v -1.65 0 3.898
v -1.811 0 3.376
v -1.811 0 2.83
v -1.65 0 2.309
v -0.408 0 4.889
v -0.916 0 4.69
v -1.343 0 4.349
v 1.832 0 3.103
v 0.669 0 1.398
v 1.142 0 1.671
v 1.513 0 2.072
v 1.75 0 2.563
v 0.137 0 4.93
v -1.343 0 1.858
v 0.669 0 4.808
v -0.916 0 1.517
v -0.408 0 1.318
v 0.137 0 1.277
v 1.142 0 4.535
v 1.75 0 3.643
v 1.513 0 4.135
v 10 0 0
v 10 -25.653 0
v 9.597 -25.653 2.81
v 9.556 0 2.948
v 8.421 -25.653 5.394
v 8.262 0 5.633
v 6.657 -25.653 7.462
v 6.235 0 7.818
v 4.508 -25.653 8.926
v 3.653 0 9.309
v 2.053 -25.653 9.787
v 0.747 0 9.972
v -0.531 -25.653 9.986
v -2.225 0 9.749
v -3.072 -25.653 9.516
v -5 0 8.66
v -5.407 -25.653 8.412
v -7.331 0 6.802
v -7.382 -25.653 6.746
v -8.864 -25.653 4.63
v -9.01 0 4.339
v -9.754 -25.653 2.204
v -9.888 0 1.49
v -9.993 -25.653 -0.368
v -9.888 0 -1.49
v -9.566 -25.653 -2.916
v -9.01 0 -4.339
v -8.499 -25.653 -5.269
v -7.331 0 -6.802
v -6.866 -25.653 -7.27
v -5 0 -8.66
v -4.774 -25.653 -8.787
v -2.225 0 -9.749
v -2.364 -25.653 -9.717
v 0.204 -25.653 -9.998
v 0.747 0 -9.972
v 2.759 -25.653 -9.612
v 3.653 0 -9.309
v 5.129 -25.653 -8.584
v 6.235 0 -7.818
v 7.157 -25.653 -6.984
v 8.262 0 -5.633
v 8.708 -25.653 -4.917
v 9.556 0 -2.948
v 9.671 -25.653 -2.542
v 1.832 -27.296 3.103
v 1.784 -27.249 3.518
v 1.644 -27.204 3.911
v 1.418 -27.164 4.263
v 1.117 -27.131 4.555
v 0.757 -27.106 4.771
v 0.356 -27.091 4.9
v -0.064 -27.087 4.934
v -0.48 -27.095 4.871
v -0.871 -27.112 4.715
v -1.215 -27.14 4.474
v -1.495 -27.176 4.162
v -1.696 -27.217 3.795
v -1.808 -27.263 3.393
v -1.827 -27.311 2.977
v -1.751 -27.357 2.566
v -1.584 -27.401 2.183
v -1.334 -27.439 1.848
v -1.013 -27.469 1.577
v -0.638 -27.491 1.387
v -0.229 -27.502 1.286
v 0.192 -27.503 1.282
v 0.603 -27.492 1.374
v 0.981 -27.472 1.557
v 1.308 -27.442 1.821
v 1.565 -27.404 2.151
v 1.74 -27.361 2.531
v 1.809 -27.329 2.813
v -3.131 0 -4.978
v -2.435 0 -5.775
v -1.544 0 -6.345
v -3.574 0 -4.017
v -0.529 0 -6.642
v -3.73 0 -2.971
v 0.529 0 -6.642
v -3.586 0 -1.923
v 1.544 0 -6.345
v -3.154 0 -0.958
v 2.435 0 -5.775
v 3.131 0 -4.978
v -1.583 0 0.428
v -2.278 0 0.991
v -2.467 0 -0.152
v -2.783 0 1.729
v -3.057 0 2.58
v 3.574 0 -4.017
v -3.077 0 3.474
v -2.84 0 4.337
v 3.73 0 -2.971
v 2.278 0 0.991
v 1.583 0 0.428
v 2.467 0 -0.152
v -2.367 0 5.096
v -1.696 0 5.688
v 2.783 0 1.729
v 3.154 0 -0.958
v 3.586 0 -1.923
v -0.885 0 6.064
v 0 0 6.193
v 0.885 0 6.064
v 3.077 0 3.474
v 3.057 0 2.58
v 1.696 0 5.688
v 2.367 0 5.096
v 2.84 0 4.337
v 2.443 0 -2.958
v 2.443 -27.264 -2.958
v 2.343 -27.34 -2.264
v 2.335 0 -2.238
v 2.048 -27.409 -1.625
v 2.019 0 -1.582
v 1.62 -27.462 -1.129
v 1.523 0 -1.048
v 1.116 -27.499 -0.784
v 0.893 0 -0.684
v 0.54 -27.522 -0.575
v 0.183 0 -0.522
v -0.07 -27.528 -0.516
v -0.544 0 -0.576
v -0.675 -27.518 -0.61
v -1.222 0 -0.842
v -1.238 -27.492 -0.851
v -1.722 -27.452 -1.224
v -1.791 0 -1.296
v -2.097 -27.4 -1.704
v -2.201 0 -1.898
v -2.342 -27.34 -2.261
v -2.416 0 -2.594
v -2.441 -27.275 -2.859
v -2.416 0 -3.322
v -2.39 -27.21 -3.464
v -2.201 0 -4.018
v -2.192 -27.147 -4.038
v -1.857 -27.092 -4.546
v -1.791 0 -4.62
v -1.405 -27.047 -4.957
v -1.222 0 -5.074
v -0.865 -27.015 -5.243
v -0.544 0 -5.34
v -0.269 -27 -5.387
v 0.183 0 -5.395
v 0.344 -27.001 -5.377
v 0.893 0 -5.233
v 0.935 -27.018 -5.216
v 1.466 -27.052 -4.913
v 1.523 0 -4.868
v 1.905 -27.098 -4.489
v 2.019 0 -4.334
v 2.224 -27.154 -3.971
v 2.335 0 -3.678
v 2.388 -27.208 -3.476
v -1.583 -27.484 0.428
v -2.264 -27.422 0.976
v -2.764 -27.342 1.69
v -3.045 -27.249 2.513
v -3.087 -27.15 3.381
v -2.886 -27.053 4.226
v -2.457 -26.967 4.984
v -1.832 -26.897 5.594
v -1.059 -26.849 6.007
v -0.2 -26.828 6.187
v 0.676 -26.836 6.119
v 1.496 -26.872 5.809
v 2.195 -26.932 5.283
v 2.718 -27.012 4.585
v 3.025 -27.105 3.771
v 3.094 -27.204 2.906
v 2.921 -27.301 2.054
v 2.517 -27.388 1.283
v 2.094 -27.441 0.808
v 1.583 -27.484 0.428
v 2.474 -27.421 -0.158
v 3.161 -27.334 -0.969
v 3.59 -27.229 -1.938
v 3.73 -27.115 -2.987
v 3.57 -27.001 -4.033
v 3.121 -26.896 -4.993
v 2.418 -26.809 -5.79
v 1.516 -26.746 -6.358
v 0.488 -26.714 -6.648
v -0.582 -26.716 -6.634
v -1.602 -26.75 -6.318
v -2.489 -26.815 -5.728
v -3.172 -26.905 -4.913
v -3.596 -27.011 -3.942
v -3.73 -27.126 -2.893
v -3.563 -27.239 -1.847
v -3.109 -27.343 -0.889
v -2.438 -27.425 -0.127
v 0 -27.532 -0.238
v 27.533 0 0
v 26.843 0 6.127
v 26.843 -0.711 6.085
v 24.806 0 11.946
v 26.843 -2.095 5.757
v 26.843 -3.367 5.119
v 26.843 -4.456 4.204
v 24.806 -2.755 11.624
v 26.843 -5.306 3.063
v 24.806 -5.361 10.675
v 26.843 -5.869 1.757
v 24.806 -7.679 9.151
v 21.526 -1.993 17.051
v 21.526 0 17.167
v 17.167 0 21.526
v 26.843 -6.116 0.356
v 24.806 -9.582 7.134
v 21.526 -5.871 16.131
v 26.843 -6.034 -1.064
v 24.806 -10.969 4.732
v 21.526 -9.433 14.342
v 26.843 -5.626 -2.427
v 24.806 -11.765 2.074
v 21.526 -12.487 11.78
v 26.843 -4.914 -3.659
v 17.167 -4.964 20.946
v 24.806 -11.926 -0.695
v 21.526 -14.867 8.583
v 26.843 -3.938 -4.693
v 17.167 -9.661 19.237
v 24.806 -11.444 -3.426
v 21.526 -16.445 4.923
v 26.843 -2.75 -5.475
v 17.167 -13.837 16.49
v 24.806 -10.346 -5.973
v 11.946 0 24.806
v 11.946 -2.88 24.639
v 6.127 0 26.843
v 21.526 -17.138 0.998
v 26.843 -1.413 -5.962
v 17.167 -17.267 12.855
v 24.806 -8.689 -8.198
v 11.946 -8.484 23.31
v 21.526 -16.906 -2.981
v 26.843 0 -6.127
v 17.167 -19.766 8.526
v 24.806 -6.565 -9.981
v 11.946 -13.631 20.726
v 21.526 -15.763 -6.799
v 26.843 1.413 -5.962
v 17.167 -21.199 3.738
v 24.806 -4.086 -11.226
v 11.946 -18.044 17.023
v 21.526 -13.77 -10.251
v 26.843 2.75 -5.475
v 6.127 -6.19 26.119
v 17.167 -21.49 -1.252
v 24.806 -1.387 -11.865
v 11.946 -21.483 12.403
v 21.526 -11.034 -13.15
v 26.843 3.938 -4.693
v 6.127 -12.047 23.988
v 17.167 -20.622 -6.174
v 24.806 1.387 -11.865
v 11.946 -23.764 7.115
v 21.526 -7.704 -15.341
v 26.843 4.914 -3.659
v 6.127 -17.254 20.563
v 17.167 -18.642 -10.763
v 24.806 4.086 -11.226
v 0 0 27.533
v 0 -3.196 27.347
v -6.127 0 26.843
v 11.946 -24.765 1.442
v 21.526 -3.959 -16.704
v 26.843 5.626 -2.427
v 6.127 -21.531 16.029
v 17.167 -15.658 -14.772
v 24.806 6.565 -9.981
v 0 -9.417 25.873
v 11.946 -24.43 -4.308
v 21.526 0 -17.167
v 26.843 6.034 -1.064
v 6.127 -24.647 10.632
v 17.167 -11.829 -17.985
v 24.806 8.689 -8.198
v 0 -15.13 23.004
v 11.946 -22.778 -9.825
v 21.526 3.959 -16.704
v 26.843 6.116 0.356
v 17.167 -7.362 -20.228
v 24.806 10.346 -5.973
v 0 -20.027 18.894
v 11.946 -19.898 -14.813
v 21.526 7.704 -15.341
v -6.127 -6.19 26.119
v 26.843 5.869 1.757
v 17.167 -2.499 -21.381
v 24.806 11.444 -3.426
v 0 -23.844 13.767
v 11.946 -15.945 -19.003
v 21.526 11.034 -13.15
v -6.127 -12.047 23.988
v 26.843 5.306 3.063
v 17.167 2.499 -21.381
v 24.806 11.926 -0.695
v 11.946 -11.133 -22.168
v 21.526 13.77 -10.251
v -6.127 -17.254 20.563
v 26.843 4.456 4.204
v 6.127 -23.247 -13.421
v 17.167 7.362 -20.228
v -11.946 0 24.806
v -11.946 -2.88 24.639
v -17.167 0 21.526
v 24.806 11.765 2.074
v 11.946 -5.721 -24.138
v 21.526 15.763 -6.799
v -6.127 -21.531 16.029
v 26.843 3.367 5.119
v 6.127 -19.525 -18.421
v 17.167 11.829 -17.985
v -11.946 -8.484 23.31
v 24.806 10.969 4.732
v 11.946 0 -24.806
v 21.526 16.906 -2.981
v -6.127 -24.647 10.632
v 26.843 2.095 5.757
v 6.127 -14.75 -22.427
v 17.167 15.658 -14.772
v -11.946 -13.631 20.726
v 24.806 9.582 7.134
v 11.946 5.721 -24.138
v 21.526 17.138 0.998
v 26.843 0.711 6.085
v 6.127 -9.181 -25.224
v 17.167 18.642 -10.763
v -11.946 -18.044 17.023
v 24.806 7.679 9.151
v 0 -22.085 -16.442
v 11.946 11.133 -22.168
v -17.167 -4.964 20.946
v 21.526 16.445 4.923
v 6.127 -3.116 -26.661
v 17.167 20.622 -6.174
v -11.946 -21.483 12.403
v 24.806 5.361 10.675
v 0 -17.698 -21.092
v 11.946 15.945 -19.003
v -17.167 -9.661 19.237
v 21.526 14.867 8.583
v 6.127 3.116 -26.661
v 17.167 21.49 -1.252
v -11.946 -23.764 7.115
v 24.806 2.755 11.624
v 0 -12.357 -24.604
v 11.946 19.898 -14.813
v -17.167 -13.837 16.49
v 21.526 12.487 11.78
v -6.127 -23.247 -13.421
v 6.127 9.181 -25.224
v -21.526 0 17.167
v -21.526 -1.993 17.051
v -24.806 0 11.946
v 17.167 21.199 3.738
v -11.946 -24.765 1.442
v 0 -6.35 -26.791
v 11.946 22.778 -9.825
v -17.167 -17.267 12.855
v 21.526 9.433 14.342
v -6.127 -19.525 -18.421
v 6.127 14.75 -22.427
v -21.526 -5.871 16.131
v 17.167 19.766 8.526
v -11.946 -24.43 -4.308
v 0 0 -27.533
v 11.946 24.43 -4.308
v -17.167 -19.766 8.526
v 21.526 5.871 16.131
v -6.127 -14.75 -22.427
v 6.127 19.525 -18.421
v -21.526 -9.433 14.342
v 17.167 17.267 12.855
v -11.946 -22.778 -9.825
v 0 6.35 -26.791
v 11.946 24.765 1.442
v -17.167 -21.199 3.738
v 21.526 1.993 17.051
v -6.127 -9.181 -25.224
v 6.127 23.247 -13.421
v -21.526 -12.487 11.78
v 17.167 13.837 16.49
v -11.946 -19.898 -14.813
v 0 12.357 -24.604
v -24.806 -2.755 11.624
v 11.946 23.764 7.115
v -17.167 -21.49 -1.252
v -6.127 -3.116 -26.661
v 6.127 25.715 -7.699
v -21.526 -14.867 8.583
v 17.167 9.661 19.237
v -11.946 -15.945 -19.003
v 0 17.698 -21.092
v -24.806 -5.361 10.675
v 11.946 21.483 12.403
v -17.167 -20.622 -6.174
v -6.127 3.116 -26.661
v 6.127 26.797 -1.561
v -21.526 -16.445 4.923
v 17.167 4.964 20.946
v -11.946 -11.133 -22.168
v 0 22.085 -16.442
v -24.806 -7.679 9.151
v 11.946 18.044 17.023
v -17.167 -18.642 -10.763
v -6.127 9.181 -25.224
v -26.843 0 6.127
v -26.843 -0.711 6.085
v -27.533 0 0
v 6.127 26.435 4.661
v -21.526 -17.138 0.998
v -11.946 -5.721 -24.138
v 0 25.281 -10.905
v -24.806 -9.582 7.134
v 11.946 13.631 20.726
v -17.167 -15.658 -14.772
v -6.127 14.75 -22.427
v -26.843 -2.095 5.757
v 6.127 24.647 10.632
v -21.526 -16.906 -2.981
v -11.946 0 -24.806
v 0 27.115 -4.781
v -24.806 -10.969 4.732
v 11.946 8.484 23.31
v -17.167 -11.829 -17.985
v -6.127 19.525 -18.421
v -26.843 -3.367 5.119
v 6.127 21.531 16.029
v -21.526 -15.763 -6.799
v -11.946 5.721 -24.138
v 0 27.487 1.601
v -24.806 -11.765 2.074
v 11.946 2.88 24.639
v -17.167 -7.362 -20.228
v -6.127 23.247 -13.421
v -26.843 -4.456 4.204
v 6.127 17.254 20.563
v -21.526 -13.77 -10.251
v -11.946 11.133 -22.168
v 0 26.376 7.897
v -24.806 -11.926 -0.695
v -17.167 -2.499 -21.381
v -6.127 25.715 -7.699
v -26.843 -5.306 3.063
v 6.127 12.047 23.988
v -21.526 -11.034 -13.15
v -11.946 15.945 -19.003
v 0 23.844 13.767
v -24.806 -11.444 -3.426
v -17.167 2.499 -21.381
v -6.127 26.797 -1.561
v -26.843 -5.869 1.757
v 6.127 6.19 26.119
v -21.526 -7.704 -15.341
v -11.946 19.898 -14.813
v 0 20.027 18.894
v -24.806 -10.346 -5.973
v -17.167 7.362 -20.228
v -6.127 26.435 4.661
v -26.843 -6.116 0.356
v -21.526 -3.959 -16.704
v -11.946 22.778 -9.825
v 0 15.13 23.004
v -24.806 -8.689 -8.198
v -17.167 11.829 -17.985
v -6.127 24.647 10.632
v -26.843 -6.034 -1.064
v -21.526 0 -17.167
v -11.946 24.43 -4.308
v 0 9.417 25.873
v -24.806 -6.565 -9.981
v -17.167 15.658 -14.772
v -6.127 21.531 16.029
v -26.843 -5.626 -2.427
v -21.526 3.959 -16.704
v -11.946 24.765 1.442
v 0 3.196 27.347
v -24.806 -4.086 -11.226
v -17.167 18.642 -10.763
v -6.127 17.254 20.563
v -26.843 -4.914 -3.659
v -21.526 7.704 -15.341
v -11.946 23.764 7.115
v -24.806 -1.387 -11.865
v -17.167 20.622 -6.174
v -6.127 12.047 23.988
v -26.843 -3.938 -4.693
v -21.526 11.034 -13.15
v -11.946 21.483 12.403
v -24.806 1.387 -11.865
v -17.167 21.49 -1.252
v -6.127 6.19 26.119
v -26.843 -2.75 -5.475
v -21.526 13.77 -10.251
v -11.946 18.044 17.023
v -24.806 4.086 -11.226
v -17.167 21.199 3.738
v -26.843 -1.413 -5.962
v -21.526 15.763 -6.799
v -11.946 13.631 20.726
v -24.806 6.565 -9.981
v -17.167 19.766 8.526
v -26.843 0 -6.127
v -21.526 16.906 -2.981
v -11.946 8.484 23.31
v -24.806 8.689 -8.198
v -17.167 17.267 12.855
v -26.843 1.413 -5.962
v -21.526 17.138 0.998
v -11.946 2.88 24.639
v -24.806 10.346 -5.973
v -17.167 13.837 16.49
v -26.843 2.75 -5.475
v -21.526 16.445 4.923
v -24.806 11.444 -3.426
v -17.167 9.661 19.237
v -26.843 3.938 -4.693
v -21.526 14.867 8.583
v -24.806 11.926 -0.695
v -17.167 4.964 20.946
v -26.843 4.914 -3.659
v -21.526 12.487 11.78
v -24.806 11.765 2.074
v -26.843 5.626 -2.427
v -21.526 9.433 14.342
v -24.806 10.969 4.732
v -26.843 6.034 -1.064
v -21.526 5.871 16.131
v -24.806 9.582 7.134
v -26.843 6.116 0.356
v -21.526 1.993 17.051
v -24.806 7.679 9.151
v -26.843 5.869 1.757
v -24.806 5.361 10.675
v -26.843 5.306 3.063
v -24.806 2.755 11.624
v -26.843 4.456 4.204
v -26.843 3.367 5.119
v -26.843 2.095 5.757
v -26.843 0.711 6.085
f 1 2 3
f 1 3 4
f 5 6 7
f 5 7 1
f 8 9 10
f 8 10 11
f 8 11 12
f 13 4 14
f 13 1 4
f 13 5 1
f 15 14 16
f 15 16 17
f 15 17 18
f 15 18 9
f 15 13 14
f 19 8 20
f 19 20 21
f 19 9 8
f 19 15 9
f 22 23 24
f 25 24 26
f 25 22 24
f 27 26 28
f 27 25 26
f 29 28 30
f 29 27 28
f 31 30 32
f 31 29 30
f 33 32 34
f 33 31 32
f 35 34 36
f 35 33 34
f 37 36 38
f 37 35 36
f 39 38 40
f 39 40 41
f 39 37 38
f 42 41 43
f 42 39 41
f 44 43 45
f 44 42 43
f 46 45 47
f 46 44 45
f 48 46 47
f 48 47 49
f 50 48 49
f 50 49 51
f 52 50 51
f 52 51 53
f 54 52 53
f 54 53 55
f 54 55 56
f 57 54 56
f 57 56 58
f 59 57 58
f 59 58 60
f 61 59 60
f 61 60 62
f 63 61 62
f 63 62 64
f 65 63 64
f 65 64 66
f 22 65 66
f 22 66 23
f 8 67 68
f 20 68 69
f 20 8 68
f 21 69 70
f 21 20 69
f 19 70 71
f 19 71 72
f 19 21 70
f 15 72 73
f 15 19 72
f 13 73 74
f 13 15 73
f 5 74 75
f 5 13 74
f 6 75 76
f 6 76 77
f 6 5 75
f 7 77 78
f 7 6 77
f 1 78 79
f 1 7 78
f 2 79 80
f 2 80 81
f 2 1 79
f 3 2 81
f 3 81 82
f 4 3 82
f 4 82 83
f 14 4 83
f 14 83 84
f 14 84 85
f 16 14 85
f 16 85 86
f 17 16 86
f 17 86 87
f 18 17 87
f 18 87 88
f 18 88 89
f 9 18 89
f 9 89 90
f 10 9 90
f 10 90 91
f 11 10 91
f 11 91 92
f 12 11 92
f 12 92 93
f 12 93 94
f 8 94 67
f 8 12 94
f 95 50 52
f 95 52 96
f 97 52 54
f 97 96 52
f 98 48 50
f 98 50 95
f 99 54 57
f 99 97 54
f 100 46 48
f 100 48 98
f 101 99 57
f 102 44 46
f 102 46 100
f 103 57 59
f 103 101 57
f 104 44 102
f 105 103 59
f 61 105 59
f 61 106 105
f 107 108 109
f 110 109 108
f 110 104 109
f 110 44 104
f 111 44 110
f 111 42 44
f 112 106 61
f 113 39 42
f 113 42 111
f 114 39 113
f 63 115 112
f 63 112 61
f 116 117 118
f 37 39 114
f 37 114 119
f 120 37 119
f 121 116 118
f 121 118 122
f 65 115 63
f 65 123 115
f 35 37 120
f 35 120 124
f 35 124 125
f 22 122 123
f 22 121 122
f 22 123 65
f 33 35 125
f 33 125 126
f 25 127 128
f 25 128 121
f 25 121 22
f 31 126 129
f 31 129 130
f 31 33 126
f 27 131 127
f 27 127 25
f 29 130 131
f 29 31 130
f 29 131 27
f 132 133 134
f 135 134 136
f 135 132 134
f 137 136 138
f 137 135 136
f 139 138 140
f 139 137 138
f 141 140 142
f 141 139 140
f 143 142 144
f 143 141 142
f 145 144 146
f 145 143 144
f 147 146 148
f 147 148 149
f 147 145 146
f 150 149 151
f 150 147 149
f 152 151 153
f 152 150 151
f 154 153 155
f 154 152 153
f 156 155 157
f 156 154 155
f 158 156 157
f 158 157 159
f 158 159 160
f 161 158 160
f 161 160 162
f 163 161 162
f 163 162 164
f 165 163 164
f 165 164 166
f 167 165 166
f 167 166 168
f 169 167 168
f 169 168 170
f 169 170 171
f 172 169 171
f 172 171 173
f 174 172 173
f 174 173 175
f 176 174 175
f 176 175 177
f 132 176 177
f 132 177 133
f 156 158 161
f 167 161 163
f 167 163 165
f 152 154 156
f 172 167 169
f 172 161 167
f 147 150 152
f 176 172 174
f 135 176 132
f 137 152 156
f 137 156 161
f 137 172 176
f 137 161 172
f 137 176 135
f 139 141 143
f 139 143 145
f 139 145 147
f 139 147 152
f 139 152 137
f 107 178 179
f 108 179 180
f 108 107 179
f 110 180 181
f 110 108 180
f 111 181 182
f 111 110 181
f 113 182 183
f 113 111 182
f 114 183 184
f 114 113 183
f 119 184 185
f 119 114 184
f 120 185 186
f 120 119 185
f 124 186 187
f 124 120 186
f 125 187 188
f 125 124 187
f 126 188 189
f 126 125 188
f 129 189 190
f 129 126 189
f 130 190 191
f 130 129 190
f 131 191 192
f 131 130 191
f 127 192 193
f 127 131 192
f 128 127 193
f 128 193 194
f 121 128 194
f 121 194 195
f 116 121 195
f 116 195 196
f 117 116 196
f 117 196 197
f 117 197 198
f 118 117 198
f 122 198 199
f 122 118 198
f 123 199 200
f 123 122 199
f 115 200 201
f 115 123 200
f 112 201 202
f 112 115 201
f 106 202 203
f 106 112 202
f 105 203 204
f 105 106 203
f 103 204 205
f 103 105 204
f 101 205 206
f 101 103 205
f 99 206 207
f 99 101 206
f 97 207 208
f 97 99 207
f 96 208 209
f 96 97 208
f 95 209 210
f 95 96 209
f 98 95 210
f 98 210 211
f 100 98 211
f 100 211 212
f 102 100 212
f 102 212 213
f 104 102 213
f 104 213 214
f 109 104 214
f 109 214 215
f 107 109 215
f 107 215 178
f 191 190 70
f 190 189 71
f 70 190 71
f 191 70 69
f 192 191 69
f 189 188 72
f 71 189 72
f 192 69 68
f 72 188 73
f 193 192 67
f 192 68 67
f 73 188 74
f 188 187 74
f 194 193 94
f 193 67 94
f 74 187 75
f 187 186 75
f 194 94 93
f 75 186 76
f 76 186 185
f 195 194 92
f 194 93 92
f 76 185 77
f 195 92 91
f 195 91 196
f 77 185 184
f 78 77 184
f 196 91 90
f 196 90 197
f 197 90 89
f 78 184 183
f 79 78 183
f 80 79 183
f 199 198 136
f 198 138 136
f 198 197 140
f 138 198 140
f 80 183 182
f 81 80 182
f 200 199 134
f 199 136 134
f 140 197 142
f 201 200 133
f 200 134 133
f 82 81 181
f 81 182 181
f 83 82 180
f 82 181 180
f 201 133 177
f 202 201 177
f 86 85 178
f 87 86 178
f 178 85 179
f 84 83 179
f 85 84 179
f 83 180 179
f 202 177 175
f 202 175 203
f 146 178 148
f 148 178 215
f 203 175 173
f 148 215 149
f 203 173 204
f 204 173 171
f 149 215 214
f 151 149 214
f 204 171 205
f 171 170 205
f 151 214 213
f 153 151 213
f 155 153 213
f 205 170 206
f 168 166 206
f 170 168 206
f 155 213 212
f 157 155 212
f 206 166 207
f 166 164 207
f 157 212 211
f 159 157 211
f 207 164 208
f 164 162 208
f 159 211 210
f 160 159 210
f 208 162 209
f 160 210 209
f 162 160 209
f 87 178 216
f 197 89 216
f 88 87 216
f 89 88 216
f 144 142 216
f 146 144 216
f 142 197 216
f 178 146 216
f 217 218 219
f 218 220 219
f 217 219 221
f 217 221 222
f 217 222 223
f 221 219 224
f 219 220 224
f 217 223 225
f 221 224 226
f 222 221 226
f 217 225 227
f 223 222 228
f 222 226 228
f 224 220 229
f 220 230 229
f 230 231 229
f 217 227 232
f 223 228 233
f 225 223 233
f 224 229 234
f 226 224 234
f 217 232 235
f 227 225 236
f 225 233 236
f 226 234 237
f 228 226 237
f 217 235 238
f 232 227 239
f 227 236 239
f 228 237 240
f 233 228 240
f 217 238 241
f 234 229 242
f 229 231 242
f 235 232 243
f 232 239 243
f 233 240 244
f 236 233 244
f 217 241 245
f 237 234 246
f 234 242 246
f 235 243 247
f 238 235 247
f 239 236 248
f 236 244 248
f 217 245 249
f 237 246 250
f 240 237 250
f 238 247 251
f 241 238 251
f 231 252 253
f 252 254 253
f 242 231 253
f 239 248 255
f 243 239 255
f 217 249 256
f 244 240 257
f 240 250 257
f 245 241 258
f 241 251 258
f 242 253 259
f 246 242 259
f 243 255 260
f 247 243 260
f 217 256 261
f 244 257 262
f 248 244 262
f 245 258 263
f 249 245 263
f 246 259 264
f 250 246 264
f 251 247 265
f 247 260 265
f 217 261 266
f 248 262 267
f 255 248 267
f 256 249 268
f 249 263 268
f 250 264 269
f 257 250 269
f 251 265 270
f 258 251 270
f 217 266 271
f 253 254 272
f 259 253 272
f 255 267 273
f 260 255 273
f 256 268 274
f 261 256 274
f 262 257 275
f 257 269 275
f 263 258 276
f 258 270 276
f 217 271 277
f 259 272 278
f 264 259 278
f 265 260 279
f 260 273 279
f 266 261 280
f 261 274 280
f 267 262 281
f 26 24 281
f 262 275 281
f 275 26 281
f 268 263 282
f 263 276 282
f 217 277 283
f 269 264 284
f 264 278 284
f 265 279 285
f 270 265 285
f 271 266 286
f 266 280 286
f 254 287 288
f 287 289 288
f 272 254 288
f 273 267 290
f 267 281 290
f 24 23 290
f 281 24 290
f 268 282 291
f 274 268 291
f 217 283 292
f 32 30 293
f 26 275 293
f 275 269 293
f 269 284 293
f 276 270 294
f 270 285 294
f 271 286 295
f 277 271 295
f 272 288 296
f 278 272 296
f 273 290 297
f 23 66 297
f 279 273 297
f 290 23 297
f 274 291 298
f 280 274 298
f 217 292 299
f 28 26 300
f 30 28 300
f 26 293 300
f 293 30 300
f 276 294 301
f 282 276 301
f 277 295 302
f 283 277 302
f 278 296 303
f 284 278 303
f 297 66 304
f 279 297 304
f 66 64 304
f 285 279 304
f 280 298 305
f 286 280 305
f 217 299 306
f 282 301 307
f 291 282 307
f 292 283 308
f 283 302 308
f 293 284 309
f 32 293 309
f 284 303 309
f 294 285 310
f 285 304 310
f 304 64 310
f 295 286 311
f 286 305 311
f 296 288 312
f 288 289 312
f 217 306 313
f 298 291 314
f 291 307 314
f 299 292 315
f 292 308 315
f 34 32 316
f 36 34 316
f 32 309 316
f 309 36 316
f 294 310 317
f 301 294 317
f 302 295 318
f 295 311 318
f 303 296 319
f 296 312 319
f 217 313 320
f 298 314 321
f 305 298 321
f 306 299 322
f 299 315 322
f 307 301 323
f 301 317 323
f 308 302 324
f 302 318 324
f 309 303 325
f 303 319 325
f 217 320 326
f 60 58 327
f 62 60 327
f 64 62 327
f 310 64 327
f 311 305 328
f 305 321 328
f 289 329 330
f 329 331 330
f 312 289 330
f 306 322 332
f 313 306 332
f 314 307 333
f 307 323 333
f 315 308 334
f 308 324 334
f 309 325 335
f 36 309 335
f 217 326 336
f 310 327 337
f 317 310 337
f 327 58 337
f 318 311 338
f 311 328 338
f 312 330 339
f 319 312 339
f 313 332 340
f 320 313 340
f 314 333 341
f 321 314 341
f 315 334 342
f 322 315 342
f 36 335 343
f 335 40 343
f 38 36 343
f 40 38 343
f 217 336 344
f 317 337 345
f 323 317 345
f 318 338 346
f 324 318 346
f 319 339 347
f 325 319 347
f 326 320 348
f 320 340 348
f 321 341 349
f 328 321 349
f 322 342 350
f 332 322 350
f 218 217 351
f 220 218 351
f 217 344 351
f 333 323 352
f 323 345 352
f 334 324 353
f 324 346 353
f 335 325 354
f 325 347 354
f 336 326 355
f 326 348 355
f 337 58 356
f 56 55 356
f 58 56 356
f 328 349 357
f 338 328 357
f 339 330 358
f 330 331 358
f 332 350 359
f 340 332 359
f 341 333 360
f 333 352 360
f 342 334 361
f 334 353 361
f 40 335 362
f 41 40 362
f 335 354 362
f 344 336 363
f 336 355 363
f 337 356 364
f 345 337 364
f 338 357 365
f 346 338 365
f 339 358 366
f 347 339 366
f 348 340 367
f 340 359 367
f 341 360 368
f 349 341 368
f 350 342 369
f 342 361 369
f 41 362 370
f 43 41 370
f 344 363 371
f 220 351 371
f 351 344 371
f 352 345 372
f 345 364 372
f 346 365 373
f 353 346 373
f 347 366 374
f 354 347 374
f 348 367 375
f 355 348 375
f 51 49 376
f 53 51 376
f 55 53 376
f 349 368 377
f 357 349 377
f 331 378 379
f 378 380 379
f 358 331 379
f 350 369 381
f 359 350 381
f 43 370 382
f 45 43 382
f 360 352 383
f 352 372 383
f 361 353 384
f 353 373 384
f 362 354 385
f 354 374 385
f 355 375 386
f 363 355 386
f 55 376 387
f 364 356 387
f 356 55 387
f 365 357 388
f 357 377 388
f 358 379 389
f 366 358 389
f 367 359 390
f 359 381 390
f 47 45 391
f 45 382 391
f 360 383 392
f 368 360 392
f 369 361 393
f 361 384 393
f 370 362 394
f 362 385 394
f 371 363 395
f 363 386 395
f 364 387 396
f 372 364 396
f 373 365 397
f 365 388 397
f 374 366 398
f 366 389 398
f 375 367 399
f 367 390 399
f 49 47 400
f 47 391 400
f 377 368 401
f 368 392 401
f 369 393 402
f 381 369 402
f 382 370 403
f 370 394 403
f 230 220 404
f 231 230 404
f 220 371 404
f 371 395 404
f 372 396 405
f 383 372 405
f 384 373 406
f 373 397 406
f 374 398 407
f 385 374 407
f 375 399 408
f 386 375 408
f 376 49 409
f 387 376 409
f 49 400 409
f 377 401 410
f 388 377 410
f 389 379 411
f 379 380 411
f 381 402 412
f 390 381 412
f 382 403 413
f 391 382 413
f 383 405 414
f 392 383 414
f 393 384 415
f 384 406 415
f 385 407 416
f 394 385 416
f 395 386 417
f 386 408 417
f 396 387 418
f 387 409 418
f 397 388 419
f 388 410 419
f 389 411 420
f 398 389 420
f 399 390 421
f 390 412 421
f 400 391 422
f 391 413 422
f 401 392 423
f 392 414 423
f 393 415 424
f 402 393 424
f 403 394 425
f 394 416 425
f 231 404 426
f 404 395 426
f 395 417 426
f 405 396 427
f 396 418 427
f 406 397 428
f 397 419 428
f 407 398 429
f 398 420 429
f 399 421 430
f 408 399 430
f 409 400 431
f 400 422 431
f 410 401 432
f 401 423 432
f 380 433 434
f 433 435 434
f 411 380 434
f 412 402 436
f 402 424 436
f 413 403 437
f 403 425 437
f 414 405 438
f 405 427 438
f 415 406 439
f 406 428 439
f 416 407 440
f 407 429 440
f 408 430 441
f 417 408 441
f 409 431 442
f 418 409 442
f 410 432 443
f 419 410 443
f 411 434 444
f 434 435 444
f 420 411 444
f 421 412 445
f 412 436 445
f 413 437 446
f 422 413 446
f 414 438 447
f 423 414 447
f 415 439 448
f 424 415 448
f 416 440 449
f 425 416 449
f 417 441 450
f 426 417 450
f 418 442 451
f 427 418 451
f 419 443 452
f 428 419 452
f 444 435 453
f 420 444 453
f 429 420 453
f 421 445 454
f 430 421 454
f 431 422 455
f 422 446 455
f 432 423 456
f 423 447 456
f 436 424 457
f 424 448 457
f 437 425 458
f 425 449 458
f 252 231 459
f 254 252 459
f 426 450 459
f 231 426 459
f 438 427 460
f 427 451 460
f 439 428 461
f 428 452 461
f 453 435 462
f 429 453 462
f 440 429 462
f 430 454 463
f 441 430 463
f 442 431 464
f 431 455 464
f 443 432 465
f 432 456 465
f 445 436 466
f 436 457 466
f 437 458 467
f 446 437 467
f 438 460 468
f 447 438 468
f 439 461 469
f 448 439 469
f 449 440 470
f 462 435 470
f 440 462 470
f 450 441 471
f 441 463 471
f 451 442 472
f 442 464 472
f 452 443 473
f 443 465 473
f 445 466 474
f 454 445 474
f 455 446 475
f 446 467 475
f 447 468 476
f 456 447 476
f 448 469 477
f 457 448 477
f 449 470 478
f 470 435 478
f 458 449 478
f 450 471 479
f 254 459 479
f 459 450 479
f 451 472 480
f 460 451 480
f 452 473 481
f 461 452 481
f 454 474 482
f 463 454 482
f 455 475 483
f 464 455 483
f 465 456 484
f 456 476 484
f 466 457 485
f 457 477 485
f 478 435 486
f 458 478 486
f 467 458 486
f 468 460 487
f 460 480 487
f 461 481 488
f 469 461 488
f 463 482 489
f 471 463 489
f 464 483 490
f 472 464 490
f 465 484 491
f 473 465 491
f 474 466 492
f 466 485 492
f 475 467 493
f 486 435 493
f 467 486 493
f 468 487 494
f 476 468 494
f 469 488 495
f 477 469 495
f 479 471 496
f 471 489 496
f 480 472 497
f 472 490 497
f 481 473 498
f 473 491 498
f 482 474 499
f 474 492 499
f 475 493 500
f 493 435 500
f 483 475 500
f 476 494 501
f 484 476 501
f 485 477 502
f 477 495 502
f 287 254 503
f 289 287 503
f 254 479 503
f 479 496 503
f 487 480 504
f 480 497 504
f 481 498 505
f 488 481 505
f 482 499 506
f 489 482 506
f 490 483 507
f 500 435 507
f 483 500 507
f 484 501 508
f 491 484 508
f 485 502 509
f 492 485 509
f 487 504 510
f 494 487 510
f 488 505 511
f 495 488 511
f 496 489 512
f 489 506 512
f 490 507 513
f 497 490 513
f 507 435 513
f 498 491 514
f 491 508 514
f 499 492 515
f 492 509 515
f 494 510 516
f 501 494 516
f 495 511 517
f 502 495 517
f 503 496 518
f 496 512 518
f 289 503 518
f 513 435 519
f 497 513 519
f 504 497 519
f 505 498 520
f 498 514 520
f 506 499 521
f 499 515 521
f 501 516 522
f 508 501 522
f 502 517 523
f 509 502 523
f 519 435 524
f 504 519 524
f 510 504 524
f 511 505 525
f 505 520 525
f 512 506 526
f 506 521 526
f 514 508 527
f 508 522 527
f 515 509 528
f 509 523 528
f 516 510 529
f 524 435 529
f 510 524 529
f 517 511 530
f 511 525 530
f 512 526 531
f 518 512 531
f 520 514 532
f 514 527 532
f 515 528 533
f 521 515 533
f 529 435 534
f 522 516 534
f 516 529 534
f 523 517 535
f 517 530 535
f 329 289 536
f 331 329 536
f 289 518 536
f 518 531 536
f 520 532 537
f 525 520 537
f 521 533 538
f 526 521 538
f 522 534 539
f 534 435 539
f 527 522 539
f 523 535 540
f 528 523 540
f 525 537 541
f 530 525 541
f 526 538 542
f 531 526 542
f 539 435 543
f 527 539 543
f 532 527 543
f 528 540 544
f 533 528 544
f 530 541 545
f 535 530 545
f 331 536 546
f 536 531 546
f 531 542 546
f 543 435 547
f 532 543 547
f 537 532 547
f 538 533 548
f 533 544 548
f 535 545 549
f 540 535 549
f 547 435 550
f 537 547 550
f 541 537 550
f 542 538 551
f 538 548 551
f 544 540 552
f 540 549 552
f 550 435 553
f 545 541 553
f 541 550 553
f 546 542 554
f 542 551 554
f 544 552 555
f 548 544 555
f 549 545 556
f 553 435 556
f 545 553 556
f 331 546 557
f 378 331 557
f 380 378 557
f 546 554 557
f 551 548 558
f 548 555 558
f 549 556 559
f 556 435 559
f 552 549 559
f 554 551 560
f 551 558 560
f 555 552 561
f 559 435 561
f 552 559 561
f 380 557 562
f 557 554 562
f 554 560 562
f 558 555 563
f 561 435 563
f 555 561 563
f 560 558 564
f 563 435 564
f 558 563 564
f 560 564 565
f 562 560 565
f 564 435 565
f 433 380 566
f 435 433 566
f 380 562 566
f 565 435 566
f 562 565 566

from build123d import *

# Parameters (mm, degrees)
F2_R     = 10
F3_DEPTH = 27.4852500417
F4_R     = 1.8315852812
F4_R_2   = 2.4433835159
F5_DEPTH = 27.5293034423


with BuildPart() as f1:
    # F0 (on Front) → F1 (revolve)
    with BuildSketch(Plane.XZ):
        with BuildLine():
            Line((-27.533114626, 0), (27.533114626, 0))
            ThreePointArc((27.533114626, 0), (0, 27.533114626), (-27.533114626, 0))
        make_face()
    revolve(axis=Axis((6.374521181, 0, 0), (1, 0, 0)))

    # F2 (on Front) → F3 (cut, through all)
    with BuildSketch(Plane.XZ):
        Circle(F2_R)
        with BuildLine():
            ThreePointArc((-1.5828419389, 0.4278055021), (0, 6.193420209), (1.5828419389, 0.4278055021))
            ThreePointArc((1.5828419389, 0.4278055021), (0, -6.6799922122), (-1.5828419389, 0.4278055021))
        make_face(mode=Mode.SUBTRACT)
    extrude(amount=F3_DEPTH, mode=Mode.SUBTRACT)

    # F4 (on Front) → F5 (cut, through all)
    with BuildSketch(Plane.XZ):
        with Locations((0, 3.1033086125)):
            Circle(F4_R)
        with Locations((0, -2.9580835253)):
            Circle(F4_R_2)
    extrude(amount=F5_DEPTH, mode=Mode.SUBTRACT)


solid = f1.part
